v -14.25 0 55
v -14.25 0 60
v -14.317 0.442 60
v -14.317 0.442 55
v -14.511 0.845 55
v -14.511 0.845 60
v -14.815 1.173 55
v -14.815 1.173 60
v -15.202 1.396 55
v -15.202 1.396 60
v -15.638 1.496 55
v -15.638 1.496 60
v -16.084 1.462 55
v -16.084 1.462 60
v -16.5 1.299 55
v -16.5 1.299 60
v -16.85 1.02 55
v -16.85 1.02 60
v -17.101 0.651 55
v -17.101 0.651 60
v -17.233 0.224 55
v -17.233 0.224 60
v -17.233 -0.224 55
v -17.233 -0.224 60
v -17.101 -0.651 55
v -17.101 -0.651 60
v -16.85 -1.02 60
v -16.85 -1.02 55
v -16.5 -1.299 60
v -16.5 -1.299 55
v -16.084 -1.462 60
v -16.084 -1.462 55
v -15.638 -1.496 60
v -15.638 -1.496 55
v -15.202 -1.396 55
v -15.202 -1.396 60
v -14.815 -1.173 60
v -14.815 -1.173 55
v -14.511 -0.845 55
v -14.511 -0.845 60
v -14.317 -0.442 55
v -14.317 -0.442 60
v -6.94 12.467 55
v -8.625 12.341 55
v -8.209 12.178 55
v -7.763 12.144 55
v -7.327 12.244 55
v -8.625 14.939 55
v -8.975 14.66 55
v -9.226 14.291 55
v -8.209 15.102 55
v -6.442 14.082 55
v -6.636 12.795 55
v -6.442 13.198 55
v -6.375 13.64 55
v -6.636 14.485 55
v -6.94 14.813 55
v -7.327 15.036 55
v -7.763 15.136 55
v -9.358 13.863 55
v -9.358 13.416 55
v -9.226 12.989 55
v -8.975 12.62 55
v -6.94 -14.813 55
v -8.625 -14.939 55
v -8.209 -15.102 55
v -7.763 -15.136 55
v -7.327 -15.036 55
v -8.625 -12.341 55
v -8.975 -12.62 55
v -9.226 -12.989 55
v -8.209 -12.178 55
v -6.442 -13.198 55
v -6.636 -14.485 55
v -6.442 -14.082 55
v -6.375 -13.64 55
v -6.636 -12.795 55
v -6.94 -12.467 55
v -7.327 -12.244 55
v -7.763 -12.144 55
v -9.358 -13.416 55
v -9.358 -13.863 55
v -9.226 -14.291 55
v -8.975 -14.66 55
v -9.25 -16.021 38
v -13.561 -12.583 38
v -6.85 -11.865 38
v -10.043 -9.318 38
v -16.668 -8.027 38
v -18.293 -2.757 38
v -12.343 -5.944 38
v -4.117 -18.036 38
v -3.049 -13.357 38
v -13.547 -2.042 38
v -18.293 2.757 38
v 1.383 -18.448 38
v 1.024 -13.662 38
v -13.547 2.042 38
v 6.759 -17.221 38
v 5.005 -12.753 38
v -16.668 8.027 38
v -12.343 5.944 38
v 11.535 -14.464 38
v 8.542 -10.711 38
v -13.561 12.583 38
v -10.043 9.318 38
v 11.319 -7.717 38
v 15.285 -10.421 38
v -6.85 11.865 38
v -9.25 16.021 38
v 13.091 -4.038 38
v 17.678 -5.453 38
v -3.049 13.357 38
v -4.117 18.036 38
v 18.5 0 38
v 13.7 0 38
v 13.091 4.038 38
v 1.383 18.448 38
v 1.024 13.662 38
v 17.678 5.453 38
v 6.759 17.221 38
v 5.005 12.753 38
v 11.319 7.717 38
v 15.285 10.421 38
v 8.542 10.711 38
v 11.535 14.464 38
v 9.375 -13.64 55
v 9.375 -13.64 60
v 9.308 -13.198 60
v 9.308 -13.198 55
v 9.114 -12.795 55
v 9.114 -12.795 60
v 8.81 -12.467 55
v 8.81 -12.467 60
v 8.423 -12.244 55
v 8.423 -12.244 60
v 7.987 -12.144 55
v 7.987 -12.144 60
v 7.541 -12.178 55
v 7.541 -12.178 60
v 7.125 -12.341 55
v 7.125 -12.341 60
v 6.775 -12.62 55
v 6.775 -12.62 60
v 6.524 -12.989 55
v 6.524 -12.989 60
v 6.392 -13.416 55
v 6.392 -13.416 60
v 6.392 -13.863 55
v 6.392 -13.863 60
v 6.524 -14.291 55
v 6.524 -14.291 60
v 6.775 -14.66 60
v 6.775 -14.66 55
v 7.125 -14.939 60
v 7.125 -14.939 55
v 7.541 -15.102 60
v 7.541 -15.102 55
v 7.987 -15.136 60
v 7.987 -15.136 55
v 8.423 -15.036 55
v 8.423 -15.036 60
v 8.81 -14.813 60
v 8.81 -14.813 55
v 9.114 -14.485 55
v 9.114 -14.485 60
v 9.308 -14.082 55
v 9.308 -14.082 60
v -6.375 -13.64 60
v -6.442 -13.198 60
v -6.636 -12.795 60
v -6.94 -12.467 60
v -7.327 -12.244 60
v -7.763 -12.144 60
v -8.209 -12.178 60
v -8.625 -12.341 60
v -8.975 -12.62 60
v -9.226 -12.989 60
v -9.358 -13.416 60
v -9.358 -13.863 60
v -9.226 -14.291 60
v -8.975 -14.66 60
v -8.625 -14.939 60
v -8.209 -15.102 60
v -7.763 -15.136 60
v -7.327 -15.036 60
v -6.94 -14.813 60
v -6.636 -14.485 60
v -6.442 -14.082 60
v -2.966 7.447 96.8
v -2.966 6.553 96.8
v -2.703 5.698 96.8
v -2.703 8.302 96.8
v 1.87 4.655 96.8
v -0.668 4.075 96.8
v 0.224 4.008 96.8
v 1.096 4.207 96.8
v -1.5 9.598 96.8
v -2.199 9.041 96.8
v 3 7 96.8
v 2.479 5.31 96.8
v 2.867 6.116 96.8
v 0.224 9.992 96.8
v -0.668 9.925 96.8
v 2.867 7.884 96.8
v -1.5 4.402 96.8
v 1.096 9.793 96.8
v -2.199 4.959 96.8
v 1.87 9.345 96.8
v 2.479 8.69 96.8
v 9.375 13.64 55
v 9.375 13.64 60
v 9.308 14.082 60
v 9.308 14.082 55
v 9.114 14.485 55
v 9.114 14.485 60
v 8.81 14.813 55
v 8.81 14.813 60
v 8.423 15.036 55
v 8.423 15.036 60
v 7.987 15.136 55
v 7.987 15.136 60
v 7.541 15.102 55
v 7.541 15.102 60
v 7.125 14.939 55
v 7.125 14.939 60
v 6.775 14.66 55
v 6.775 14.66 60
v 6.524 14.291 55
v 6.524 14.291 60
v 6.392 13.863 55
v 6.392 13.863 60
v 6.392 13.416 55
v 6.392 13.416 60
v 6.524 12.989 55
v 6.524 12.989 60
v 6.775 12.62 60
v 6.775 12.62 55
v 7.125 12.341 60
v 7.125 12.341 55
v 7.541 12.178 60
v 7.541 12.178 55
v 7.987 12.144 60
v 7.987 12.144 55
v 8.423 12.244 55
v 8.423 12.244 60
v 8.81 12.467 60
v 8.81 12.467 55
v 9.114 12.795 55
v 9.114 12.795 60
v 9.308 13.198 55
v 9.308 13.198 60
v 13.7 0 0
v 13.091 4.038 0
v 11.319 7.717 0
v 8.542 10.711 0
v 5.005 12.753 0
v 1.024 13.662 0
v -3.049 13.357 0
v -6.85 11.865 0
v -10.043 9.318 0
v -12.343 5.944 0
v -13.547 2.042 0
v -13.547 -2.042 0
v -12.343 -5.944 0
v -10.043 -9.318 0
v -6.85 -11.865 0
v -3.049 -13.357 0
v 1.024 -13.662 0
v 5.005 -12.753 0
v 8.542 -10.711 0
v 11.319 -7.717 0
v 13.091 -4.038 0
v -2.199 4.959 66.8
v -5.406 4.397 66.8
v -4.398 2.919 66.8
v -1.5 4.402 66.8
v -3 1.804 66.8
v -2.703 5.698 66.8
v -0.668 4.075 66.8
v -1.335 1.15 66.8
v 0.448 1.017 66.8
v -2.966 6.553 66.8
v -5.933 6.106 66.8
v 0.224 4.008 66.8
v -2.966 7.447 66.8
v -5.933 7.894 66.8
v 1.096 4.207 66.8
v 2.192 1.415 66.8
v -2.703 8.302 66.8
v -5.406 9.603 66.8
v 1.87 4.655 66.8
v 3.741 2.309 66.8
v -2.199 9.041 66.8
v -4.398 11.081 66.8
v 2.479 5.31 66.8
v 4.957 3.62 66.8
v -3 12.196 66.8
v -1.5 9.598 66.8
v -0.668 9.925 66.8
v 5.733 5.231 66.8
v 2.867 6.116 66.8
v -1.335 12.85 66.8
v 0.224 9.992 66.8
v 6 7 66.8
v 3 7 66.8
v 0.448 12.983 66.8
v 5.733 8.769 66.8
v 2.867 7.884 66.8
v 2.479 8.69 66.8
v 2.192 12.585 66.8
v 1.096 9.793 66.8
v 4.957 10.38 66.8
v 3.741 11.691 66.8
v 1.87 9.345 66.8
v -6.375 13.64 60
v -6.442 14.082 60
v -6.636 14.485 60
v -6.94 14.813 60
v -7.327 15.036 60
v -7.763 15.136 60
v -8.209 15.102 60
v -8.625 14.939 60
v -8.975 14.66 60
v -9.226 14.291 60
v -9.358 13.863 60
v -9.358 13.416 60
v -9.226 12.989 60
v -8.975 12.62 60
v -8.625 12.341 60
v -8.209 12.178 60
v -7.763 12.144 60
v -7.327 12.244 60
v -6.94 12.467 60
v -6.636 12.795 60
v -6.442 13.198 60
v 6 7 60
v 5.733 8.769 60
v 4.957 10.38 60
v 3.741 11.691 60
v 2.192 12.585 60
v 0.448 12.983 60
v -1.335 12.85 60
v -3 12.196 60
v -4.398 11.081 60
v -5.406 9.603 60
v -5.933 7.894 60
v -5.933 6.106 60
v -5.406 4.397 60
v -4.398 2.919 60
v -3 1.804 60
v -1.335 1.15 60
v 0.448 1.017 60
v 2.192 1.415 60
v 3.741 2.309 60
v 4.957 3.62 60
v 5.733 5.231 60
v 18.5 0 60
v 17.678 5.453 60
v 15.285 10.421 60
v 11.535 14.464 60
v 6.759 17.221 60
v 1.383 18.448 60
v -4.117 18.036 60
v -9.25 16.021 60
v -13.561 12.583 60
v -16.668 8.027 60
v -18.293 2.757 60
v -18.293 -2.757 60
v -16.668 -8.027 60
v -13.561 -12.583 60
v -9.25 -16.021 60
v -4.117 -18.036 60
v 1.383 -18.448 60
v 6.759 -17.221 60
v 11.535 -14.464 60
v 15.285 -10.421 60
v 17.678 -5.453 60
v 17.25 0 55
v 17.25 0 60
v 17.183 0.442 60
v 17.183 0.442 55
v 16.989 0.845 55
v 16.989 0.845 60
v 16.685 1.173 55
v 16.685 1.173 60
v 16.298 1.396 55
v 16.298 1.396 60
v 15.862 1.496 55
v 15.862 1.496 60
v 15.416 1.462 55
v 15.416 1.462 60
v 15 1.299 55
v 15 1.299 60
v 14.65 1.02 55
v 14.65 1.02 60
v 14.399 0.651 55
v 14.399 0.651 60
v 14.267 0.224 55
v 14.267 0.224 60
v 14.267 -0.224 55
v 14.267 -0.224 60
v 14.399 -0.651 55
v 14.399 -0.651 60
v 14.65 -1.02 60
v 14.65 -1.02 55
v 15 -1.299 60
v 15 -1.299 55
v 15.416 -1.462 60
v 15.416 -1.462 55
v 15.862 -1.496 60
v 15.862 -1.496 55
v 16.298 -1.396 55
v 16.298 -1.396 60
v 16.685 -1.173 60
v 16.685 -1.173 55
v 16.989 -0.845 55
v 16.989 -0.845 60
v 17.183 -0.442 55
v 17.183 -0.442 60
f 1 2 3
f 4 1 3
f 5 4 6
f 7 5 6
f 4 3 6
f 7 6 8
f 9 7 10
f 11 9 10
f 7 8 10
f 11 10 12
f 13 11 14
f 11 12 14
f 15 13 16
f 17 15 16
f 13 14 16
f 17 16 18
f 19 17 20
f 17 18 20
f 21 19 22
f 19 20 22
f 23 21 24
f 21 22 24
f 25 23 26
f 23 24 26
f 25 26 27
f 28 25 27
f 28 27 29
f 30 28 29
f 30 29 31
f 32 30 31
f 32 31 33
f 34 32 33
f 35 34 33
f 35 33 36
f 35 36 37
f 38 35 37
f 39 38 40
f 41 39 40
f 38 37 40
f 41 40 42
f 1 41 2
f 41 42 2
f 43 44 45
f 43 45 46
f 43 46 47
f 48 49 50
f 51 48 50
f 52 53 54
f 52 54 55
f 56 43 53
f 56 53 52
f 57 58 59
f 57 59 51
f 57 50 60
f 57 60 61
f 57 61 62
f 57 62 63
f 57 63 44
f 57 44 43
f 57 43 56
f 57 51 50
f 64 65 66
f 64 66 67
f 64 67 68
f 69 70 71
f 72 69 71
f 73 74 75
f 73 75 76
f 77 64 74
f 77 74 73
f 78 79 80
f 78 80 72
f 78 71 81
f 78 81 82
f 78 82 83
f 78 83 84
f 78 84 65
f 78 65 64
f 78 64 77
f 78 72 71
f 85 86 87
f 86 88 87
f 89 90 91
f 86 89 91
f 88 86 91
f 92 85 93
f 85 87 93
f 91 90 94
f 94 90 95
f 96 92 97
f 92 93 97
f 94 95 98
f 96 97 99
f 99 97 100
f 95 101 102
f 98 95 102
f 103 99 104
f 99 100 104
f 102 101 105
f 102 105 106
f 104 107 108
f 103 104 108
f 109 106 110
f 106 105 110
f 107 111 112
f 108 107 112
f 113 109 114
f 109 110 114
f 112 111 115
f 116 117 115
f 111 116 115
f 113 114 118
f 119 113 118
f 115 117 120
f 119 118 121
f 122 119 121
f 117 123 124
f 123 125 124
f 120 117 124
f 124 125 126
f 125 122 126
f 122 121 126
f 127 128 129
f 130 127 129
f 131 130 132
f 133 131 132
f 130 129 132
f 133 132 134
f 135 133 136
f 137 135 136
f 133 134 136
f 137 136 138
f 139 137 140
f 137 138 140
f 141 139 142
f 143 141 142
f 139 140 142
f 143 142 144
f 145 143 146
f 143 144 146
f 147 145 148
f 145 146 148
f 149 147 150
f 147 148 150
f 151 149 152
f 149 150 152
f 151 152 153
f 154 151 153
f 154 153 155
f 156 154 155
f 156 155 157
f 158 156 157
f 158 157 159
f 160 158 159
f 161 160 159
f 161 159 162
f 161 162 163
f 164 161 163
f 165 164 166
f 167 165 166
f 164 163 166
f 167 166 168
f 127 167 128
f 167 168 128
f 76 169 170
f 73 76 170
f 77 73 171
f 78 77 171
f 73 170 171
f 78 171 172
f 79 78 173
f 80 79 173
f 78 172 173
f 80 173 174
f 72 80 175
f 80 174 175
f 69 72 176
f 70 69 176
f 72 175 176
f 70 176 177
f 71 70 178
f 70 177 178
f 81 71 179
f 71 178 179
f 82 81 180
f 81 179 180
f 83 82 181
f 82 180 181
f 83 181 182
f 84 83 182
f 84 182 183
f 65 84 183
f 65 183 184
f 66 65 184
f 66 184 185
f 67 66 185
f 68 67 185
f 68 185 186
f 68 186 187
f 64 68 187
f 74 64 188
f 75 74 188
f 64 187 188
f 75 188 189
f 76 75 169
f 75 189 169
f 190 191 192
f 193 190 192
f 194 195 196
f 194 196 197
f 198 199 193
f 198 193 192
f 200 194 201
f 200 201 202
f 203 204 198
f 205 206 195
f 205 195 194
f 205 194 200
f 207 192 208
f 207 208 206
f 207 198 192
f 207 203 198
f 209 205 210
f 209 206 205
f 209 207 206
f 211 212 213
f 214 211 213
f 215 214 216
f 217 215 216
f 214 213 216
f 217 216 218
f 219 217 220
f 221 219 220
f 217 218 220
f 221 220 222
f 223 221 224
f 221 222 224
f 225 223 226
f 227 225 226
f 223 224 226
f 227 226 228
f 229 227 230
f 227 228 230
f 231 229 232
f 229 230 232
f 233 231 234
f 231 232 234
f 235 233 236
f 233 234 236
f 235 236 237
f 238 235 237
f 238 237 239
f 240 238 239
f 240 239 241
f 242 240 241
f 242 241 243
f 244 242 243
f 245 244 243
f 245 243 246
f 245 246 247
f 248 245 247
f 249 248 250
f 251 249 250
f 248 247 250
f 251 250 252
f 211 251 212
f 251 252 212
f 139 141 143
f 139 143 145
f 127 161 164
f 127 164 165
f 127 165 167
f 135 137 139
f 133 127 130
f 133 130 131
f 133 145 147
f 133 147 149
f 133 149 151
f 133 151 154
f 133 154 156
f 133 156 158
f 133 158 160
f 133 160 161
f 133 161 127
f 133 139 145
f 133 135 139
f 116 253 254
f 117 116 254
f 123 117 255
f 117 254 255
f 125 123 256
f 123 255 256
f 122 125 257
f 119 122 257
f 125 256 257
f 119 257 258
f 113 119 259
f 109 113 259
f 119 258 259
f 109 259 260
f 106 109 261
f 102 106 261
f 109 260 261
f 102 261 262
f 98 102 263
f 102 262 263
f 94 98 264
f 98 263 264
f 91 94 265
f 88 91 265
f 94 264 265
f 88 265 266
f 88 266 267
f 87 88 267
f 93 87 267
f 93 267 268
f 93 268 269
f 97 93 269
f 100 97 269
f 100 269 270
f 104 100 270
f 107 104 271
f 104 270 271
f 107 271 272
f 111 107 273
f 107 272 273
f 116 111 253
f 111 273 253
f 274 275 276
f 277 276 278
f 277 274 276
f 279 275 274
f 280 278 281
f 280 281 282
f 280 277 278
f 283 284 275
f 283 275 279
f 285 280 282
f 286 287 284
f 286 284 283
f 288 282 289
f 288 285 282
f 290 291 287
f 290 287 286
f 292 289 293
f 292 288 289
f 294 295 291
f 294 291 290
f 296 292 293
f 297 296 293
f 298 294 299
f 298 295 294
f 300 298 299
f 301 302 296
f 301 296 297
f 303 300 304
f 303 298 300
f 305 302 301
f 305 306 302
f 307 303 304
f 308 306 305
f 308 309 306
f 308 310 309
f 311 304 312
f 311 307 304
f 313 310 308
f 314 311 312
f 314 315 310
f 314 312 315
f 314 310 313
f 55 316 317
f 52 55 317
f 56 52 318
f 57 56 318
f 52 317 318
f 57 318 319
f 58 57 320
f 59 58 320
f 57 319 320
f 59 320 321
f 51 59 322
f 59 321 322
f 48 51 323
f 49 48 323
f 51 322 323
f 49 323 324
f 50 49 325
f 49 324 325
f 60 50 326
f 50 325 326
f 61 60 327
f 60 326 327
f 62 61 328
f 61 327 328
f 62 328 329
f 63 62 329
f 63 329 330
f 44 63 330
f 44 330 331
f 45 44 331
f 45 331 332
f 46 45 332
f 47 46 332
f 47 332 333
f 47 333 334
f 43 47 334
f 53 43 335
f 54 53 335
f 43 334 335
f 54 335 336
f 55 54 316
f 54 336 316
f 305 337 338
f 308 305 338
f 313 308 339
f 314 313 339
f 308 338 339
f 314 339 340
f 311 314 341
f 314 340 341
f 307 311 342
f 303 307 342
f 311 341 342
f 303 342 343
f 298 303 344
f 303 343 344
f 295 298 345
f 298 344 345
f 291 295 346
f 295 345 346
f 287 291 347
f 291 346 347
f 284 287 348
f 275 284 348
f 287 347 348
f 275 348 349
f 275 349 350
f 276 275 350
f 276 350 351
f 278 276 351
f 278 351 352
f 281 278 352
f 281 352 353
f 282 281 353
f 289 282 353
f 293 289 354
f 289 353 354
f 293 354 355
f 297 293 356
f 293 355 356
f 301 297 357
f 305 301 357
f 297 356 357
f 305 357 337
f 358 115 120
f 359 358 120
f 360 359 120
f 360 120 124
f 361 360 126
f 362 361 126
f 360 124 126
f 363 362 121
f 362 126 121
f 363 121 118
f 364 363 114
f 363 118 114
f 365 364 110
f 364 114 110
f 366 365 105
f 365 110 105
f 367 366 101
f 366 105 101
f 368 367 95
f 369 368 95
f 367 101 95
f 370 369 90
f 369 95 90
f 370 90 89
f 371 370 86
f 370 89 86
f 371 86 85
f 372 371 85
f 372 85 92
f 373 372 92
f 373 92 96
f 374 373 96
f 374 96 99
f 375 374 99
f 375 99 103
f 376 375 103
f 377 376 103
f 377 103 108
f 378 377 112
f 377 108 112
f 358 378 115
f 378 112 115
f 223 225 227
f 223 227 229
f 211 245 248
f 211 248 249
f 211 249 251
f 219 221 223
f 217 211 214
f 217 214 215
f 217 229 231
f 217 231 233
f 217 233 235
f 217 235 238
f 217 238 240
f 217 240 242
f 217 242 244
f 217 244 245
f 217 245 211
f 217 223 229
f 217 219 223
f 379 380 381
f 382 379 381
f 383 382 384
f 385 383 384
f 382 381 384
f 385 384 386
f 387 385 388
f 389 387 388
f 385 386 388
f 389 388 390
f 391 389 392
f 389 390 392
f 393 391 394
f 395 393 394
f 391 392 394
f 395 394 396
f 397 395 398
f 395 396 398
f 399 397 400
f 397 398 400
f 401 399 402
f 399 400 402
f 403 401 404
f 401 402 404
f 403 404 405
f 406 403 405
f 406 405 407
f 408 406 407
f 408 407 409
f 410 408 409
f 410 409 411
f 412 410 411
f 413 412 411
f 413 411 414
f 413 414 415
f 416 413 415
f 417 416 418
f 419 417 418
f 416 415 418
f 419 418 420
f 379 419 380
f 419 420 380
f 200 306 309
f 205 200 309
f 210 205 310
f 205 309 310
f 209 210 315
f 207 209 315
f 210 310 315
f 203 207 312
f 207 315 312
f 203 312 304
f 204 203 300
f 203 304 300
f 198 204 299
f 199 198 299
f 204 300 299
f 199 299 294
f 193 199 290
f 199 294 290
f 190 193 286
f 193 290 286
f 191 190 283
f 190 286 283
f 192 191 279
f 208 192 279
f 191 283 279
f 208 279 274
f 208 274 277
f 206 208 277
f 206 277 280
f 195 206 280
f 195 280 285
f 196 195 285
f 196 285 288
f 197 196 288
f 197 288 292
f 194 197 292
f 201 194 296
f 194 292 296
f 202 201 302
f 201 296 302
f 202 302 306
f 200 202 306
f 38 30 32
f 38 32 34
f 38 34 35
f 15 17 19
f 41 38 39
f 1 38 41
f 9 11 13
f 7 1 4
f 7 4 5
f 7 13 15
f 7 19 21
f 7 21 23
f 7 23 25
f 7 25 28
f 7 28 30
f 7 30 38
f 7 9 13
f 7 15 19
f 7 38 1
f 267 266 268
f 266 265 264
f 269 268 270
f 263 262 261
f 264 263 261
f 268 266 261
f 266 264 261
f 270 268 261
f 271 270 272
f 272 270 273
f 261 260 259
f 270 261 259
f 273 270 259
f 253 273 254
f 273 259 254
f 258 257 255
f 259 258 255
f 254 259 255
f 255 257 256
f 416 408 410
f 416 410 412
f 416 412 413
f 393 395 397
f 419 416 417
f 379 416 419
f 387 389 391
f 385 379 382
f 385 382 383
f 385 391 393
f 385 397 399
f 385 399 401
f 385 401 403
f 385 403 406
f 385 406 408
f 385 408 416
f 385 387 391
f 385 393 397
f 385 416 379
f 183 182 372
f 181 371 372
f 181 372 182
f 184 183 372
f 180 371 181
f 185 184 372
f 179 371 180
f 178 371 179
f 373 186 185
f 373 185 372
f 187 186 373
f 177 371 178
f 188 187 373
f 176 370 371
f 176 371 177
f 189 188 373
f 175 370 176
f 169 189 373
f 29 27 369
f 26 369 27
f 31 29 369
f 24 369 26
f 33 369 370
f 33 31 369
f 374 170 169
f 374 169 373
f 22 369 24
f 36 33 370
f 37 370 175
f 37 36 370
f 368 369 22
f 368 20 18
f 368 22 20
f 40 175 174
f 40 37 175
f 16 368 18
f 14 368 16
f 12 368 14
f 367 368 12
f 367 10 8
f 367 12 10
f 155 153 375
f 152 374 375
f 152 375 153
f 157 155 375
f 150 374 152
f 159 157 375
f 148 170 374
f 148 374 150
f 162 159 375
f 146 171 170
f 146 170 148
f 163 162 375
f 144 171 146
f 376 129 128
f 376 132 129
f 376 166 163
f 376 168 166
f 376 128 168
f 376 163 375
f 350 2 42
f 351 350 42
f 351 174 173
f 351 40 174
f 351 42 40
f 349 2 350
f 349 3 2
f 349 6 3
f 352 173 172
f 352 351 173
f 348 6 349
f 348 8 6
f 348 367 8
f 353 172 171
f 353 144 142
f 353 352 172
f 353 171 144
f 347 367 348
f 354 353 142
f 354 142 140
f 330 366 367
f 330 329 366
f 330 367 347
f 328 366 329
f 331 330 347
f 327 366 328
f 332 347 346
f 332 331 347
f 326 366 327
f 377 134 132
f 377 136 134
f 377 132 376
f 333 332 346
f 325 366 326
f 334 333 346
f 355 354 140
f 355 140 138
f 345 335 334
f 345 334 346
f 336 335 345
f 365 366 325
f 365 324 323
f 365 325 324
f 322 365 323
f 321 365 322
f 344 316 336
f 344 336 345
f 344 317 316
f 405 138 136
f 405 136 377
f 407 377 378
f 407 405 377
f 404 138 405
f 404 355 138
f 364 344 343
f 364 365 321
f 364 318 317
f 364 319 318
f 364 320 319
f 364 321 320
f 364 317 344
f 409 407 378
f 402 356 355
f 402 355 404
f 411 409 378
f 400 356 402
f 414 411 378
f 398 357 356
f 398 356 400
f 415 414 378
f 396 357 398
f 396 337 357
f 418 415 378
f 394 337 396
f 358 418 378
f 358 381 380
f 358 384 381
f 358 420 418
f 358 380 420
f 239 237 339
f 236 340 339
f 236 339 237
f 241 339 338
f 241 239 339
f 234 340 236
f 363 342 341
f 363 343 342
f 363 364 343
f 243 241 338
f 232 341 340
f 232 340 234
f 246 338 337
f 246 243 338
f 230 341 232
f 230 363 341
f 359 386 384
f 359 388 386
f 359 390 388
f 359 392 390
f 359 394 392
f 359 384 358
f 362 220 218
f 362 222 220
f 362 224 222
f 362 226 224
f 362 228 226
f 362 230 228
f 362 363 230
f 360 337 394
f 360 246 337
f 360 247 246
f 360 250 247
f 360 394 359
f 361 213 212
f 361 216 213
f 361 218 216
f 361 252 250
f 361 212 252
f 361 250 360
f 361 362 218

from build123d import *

# Parameters (mm, degrees)
SKETCH1_R           = 13.7
BOSS_EXTRUDE1_DEPTH = 38
SKETCH2_R           = 18.5
BOSS_EXTRUDE2_DEPTH = 22
SKETCH3_R           = 6
BOSS_EXTRUDE3_DEPTH = 6.8
SKETCH4_R           = 3
BOSS_EXTRUDE4_DEPTH = 30
SKETCH5_R           = 1.5
CUT_EXTRUDE1_DEPTH  = 5


with BuildPart() as part:
    # Sketch1 → Boss-Extrude1 (new body)
    with BuildSketch(Plane.XY):
        Circle(SKETCH1_R)
    extrude(amount=BOSS_EXTRUDE1_DEPTH)

    # Sketch2 → Boss-Extrude2 (add)
    with BuildSketch(Plane.XY.offset(38)):
        Circle(SKETCH2_R)
    extrude(amount=BOSS_EXTRUDE2_DEPTH)

    # Sketch3 → Boss-Extrude3 (add)
    with BuildSketch(Plane.XY.offset(60)):
        with Locations((0, 7)):
            Circle(SKETCH3_R)
    extrude(amount=BOSS_EXTRUDE3_DEPTH)

    # Sketch4 → Boss-Extrude4 (add)
    with BuildSketch(Plane.XY.offset(66.8)):
        with Locations((0, 7)):
            Circle(SKETCH4_R)
    extrude(amount=BOSS_EXTRUDE4_DEPTH)

    # Sketch5 → Cut-Extrude1 (cut)
    with BuildSketch(Plane.XY.offset(60)):
        with Locations((-15.75, 0)):
            Circle(SKETCH5_R)
        with Locations((-7.875, 13.63990011)):
            Circle(SKETCH5_R)
        with Locations((7.875, 13.63990011)):
            Circle(SKETCH5_R)
        with Locations((15.75, 0)):
            Circle(SKETCH5_R)
        with Locations((7.875, -13.63990011)):
            Circle(SKETCH5_R)
        with Locations((-7.875, -13.63990011)):
            Circle(SKETCH5_R)
    extrude(amount=-CUT_EXTRUDE1_DEPTH, mode=Mode.SUBTRACT)


solid = part.part
